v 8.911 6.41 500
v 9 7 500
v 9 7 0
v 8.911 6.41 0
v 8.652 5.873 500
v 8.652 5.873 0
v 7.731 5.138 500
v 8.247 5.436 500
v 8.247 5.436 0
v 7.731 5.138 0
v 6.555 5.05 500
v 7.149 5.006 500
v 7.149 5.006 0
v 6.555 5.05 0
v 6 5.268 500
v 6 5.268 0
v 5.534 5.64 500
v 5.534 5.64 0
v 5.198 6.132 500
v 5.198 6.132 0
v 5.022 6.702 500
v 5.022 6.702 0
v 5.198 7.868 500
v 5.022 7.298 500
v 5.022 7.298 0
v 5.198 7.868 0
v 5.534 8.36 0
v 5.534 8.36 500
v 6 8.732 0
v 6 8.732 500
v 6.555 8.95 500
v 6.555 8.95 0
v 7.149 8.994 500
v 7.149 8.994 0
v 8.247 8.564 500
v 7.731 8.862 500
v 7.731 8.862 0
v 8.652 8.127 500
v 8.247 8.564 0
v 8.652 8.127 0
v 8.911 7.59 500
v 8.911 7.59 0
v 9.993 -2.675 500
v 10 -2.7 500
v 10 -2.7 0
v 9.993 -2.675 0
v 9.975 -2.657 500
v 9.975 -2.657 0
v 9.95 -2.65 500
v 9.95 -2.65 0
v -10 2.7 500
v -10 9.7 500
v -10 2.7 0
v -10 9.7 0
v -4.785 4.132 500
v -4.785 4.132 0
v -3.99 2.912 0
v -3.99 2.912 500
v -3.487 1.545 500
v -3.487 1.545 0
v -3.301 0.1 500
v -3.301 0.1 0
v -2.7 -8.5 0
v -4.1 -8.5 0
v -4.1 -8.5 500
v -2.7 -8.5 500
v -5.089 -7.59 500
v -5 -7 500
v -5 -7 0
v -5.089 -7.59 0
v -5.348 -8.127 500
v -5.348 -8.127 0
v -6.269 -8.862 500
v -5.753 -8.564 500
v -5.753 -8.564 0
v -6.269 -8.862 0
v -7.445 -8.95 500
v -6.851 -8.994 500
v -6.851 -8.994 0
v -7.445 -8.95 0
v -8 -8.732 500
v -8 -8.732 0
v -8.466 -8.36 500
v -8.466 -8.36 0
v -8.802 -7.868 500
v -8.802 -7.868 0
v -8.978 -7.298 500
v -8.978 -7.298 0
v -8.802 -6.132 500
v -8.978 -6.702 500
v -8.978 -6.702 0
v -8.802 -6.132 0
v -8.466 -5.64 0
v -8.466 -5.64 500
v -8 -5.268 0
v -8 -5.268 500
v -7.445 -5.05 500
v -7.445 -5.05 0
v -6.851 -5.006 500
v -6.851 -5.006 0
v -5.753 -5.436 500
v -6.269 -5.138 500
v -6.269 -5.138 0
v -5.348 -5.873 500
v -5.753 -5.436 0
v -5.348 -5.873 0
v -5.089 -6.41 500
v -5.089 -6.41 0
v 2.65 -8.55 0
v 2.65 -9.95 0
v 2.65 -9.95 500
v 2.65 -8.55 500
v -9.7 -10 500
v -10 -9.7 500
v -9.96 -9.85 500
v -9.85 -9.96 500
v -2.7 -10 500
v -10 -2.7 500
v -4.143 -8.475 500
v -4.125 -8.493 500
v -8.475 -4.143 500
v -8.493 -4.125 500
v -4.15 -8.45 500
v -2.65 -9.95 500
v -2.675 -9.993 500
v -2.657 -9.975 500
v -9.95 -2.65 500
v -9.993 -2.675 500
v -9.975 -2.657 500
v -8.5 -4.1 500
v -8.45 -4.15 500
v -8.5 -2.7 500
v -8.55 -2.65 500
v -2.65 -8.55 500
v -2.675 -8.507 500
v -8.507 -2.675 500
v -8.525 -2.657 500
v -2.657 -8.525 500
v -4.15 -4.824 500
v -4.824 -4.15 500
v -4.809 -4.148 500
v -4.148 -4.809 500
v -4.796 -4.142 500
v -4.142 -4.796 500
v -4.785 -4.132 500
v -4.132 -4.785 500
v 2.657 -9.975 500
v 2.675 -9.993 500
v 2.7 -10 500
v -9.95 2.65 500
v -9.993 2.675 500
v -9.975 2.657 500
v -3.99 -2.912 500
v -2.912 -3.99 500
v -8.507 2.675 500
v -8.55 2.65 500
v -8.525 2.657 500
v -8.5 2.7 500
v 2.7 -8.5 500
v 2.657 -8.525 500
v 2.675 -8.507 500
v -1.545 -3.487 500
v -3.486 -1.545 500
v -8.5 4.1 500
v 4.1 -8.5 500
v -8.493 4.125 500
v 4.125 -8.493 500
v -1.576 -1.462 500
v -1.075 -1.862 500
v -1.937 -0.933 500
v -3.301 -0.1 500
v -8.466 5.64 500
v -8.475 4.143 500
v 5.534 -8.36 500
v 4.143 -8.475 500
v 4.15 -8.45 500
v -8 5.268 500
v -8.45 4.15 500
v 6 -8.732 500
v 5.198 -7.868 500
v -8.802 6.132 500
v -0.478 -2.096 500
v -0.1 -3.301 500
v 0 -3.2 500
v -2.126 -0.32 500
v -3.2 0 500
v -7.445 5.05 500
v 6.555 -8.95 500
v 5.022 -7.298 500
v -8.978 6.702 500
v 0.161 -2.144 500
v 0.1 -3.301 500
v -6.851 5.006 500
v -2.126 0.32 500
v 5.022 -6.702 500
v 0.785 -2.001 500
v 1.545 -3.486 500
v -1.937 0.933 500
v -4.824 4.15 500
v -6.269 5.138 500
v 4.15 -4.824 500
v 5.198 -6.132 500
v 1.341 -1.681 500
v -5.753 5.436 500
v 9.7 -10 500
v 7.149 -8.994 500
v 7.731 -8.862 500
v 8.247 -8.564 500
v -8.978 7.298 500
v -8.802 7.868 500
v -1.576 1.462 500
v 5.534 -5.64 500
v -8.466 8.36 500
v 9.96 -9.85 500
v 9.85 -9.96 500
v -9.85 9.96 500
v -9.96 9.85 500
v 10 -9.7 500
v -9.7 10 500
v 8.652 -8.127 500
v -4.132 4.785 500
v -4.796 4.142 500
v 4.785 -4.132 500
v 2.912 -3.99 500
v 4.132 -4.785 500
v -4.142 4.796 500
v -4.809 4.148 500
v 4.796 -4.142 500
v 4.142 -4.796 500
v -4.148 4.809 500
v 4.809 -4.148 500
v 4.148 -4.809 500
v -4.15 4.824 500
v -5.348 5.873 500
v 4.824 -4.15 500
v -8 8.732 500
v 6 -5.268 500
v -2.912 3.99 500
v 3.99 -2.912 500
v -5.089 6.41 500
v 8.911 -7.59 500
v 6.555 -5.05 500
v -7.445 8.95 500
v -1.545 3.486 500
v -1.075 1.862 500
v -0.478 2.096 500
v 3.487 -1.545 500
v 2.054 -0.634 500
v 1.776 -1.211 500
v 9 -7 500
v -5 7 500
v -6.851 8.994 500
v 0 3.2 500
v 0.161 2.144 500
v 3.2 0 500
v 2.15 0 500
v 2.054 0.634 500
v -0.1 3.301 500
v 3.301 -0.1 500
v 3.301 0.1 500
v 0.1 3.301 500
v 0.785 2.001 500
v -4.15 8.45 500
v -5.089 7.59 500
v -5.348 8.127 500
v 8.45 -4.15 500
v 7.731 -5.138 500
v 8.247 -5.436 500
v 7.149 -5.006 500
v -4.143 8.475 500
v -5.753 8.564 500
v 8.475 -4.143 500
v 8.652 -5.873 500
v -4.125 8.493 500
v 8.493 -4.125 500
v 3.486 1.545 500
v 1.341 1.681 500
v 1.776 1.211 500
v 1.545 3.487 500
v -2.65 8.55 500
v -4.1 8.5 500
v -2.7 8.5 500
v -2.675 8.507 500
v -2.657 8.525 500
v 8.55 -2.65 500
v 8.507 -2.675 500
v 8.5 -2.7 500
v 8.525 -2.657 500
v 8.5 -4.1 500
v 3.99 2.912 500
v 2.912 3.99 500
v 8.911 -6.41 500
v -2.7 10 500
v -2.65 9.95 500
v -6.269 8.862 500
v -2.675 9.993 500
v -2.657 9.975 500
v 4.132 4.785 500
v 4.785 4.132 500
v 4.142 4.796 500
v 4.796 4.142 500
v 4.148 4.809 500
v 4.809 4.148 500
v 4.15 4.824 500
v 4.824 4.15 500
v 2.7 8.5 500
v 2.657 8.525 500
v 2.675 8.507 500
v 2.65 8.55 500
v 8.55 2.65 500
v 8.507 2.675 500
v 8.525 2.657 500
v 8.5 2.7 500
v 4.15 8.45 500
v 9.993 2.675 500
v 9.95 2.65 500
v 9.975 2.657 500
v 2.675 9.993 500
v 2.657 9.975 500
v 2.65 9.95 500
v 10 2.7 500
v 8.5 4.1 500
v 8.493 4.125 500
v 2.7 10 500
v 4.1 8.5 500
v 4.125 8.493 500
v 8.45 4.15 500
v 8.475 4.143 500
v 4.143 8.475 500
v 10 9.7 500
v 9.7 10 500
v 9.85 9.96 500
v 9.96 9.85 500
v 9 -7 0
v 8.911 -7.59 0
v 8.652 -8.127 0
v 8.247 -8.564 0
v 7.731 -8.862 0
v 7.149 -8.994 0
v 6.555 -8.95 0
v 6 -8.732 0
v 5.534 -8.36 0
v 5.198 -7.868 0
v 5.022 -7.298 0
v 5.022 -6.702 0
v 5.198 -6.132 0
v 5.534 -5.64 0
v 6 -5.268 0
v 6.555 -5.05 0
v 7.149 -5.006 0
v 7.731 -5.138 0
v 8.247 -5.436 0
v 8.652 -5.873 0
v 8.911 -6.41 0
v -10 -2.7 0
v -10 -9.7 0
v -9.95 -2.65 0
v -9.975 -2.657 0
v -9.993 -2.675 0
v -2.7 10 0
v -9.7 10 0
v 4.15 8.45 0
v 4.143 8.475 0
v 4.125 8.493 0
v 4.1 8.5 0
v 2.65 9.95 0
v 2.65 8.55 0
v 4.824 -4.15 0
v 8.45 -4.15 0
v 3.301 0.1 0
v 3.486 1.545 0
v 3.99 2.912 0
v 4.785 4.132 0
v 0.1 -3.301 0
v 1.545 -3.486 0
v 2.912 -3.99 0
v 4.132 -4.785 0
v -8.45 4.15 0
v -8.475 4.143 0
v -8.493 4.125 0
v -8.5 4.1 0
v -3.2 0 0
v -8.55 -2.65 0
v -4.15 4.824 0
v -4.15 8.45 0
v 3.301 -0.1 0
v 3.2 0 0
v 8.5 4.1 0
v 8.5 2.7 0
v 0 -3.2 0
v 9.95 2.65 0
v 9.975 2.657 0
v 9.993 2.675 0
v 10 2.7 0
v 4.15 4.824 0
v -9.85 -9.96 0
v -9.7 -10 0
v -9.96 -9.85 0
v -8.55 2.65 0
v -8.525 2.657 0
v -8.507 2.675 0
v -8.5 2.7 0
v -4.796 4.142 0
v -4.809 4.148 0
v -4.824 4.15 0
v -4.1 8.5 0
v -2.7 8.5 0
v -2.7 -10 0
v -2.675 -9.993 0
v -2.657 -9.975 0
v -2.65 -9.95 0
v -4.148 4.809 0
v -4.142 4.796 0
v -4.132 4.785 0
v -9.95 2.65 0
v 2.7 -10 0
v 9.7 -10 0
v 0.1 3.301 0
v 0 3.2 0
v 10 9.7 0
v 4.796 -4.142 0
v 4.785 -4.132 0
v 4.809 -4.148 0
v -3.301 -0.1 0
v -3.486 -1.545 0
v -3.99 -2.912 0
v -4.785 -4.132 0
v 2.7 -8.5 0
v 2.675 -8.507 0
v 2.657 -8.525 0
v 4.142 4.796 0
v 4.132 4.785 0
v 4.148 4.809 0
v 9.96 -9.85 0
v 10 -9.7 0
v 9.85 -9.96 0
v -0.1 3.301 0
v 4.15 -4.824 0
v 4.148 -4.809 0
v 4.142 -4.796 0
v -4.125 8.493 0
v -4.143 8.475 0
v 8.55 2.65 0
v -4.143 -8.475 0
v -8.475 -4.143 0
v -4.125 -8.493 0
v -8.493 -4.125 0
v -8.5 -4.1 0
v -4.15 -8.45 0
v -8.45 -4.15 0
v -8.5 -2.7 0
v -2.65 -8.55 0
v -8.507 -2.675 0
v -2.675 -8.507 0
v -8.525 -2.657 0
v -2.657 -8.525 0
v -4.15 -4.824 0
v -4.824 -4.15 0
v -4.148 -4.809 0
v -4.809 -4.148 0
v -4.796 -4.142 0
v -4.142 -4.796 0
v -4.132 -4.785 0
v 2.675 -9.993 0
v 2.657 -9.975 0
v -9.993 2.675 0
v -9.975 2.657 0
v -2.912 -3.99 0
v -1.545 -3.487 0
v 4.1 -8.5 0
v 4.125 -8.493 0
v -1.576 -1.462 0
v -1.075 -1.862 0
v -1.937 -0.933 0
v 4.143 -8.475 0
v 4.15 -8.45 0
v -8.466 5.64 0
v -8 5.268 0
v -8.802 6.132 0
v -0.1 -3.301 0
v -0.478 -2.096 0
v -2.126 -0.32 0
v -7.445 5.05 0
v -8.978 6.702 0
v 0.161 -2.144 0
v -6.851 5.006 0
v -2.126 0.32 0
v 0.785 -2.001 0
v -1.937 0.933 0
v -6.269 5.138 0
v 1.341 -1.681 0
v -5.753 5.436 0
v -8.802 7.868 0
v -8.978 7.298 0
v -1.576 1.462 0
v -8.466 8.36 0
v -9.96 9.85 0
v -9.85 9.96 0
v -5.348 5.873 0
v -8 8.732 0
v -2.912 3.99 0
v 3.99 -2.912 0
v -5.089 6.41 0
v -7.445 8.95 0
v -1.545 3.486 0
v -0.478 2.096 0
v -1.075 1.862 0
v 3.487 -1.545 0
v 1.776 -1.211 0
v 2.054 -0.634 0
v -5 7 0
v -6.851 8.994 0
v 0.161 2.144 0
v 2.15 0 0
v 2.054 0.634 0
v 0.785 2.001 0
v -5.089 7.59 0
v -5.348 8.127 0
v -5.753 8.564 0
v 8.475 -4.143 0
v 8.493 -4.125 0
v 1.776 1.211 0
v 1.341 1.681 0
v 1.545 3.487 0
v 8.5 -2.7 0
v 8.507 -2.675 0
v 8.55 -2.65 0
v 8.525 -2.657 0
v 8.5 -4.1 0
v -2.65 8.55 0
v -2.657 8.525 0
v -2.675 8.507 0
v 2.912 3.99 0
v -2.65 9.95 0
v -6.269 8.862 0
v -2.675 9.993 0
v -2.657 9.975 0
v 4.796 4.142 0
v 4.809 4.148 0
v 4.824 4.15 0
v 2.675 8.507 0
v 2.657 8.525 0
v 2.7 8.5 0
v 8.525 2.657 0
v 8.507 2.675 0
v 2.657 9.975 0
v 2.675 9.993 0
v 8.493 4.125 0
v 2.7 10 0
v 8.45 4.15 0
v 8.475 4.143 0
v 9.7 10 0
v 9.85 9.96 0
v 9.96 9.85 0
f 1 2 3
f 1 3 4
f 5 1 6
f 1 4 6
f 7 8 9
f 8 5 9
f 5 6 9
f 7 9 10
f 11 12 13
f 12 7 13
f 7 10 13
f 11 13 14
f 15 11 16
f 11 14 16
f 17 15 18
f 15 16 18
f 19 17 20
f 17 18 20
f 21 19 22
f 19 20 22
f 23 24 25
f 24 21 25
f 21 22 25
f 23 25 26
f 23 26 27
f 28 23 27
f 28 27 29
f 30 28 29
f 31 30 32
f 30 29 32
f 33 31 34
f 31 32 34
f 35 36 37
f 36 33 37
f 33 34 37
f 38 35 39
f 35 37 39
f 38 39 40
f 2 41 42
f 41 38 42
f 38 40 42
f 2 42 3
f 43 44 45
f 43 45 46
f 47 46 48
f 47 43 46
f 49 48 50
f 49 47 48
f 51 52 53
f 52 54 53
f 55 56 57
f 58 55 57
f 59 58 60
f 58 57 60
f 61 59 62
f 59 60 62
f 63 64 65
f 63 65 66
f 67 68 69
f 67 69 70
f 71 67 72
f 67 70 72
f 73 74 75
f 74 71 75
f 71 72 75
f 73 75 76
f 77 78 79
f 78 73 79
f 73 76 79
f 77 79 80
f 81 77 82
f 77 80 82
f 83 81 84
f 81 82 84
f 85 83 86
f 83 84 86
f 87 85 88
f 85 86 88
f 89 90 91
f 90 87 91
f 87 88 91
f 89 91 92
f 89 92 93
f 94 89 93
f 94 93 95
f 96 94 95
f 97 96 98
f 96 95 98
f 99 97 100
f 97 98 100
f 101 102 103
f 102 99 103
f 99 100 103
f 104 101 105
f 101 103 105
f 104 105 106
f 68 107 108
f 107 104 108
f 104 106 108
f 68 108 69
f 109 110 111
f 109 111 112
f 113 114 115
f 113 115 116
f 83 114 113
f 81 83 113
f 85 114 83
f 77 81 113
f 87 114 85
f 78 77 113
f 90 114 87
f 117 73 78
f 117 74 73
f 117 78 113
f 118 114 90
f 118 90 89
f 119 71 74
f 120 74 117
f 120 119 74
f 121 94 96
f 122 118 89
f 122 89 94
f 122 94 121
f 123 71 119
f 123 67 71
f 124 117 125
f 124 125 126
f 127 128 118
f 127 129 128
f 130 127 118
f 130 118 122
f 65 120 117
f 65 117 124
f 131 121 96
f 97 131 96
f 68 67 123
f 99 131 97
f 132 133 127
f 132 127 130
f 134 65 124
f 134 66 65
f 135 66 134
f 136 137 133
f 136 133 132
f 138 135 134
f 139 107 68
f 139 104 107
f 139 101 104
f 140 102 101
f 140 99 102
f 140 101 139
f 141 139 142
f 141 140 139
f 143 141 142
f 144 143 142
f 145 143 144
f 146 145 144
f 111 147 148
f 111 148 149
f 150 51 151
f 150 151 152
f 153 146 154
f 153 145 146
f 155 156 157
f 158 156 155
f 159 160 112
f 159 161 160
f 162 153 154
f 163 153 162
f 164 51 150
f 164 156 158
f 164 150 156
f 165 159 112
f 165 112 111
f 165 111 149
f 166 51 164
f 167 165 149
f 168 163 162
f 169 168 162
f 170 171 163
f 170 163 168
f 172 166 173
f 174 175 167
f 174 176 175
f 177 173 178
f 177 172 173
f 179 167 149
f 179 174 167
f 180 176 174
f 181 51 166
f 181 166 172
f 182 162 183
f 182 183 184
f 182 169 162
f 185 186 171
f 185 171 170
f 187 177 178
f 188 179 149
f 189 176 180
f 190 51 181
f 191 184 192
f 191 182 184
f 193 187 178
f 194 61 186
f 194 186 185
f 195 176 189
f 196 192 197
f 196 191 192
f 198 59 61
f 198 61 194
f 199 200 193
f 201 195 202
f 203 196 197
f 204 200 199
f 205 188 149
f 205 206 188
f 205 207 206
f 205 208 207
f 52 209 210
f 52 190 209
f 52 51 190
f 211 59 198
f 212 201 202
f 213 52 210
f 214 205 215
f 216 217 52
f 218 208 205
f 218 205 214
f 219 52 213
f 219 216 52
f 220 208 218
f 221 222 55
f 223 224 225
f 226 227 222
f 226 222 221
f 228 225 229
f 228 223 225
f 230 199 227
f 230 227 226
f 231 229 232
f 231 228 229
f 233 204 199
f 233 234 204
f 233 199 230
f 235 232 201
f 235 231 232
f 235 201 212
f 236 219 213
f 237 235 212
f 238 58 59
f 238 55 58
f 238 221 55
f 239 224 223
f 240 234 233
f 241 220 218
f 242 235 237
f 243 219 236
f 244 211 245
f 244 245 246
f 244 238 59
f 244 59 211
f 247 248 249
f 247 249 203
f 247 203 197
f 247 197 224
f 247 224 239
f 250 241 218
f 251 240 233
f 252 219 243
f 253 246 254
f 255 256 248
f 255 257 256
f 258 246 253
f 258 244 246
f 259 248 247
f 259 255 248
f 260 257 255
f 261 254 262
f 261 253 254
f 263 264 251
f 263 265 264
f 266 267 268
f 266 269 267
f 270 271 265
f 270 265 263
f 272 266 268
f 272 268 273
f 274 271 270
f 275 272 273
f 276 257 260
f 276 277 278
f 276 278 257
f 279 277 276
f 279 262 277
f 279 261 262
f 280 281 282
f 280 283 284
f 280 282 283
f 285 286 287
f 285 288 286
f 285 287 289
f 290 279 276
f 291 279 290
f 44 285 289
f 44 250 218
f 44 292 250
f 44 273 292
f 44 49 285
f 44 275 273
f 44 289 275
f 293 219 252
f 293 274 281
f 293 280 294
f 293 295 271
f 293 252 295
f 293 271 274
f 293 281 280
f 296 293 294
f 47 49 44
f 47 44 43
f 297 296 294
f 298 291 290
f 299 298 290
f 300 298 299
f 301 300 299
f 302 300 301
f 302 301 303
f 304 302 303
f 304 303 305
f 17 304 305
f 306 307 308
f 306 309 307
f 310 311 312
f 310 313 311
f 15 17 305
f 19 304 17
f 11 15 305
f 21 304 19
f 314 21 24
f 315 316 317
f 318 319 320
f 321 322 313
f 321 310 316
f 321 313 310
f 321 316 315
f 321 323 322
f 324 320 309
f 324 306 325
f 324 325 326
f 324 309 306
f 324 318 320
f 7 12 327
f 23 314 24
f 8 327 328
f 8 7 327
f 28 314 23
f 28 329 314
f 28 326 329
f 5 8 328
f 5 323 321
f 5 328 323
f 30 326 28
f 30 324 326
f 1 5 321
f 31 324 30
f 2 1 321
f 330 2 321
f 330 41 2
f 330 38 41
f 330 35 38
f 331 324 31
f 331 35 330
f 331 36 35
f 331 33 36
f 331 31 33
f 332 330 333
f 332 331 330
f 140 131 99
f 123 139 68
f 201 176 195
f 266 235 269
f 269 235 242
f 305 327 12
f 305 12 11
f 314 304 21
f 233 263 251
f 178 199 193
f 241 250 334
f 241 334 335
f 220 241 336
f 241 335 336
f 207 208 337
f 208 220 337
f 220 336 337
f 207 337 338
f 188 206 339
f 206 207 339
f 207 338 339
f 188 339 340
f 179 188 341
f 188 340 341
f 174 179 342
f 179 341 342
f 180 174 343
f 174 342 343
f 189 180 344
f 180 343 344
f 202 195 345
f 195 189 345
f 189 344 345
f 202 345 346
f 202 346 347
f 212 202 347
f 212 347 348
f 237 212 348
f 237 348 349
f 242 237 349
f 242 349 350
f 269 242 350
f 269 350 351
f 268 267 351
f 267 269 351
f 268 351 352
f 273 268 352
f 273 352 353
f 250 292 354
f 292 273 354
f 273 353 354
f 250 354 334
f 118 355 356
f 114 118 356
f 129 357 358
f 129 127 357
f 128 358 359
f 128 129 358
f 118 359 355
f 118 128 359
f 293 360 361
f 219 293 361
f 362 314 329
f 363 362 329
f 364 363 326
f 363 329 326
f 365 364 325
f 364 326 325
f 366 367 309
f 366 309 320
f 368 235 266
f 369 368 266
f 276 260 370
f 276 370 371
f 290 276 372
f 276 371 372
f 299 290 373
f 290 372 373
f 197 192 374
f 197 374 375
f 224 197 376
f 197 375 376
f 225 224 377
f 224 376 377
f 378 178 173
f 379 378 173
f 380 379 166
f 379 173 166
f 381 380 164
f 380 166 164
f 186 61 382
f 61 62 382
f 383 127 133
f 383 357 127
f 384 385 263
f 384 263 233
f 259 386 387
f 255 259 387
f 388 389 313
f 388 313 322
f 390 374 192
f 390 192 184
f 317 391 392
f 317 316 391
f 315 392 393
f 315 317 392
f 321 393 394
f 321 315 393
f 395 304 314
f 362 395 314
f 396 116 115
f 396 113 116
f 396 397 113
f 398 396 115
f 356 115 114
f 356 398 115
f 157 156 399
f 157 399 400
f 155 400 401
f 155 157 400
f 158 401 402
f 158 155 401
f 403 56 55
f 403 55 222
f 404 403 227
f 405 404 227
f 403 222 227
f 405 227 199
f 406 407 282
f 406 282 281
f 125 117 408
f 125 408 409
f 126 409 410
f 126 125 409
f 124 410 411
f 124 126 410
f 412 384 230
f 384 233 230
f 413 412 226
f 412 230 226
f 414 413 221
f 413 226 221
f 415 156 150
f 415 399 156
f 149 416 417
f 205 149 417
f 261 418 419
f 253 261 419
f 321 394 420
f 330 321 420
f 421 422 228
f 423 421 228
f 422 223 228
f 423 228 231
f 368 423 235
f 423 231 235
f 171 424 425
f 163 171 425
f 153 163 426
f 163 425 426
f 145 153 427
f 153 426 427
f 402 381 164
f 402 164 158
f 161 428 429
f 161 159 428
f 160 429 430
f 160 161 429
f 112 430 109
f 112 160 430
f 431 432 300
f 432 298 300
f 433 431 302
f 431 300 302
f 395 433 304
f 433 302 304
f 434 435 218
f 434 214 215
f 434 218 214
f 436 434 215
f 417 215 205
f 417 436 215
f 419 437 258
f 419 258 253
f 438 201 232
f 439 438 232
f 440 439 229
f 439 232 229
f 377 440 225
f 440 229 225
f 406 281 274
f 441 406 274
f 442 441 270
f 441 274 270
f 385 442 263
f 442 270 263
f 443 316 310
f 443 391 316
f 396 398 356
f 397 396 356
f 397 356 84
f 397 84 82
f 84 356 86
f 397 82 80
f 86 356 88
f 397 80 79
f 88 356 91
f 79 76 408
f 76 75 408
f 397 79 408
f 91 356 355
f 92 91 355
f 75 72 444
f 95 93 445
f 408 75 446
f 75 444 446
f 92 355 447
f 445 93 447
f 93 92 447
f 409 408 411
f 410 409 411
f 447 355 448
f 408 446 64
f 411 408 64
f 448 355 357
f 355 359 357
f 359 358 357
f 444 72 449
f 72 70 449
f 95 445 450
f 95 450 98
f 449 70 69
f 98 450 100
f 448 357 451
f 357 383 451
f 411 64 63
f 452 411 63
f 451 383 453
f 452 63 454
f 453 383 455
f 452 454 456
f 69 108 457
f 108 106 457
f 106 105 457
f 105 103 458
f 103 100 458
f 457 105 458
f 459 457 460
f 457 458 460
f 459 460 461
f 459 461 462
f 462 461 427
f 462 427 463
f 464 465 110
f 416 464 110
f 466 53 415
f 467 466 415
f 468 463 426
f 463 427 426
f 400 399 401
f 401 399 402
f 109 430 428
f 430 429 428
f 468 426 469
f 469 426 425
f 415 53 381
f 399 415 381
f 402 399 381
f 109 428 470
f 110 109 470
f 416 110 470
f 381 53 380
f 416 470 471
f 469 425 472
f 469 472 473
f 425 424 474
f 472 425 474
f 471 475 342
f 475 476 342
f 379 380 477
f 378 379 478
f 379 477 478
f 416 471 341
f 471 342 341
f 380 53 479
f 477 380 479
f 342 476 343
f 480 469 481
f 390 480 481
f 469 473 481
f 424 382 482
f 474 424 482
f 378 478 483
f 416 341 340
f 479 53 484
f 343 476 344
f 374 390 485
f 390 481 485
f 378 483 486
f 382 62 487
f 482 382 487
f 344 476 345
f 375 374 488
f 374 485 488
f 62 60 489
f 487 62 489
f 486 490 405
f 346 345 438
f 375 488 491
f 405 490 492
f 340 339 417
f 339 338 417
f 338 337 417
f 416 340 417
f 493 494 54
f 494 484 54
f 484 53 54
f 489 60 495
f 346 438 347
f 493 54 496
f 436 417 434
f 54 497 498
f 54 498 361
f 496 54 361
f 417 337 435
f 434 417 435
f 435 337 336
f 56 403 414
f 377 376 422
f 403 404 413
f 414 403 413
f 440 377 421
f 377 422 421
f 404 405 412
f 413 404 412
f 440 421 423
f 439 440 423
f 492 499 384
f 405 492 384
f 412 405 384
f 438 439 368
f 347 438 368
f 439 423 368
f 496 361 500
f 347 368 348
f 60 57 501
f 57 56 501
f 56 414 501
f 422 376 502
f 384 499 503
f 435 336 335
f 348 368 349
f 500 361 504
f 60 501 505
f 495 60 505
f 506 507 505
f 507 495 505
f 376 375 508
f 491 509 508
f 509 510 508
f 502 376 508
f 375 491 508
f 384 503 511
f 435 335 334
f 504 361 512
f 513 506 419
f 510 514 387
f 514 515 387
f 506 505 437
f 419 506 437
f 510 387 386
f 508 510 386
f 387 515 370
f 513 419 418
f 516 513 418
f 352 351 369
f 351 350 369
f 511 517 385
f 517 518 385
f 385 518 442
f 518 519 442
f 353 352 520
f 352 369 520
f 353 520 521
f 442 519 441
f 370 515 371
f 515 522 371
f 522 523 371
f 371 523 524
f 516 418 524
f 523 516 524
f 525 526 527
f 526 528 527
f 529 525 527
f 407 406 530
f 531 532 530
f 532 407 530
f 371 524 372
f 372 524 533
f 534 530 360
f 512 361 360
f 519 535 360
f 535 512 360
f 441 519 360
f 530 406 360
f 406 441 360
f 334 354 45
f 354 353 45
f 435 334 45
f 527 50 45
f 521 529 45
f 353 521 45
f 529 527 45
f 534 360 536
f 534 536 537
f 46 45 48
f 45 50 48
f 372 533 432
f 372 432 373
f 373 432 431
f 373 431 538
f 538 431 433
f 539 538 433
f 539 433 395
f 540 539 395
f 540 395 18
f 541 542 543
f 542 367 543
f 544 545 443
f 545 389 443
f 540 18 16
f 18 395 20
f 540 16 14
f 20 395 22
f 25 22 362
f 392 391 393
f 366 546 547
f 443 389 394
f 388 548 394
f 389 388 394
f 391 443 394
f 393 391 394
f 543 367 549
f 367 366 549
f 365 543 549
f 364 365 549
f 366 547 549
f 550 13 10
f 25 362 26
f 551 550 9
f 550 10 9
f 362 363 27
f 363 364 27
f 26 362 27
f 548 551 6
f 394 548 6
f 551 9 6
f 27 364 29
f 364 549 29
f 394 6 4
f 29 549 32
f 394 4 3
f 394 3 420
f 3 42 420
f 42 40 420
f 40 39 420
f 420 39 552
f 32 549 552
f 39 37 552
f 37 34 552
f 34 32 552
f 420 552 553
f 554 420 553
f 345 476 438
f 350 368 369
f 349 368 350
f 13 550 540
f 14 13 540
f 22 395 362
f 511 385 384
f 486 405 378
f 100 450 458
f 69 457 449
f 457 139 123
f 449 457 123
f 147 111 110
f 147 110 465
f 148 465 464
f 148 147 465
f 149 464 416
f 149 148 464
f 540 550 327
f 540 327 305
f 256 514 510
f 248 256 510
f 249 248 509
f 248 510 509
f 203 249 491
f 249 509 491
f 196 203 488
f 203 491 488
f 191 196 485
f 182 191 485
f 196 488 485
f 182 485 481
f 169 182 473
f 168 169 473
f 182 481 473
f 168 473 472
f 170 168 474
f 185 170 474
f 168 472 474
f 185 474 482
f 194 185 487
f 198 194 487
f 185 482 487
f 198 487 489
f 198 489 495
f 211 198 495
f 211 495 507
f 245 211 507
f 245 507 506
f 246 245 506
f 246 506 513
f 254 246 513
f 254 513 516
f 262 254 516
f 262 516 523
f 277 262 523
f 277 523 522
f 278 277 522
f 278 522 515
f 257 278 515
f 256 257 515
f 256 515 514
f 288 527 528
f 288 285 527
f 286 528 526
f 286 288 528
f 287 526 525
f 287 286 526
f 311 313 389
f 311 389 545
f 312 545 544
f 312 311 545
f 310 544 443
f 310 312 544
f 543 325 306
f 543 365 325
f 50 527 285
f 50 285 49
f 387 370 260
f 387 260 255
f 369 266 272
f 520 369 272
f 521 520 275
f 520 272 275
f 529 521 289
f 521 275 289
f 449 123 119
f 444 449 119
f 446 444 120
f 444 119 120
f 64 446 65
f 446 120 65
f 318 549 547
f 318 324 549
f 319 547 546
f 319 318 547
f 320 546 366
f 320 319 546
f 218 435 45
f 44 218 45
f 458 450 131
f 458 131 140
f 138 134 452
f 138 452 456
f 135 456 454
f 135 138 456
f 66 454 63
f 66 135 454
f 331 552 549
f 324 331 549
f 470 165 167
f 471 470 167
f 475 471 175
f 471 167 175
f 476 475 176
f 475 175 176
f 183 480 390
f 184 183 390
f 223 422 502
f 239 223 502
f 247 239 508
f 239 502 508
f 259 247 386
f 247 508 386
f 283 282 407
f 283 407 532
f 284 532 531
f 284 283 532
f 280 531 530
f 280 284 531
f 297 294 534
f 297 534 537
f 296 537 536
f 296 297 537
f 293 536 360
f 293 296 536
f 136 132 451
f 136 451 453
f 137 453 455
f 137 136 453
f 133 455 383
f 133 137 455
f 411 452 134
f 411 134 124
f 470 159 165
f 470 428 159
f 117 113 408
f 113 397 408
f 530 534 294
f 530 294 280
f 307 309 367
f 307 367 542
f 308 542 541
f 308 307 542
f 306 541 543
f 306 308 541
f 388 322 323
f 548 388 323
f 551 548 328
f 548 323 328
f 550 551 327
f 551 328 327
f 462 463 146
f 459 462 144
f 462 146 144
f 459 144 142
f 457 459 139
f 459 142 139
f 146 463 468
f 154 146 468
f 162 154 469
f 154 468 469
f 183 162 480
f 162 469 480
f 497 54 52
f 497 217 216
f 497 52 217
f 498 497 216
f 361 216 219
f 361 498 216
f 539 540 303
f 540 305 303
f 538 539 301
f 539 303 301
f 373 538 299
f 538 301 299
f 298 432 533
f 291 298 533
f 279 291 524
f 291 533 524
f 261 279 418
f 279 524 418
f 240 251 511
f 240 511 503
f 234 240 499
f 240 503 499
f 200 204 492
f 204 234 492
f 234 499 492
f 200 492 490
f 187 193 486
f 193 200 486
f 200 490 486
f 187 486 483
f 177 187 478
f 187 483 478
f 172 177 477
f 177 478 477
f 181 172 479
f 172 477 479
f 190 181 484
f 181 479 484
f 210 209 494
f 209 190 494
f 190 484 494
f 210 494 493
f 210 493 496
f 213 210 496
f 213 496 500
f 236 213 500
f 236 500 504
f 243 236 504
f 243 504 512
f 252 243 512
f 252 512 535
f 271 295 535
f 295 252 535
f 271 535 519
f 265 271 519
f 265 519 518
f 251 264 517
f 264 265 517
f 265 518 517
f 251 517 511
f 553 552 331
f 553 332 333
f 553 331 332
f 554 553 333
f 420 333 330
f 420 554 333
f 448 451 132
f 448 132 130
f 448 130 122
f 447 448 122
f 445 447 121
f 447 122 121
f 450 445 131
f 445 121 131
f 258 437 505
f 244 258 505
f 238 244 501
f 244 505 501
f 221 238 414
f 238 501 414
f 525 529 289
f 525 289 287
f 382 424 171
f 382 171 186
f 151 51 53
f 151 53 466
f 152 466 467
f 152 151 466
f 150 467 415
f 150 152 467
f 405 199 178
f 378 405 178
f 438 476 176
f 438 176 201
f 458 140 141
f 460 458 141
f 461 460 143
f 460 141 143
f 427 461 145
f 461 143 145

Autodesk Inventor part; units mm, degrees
ref_plane "YZ Plane" through (0, 0, 0) normal (1, 0, 0) x (0, 1, 0)
ref_plane "XZ Plane" through (0, 0, 0) normal (0, 1, 0) x (-1, 0, 0)
ref_plane "XY Plane" through (0, 0, 0) normal (0, 0, 1) x (1, 0, 0)
sketch "스케치1" plane through (0, 0, 0) normal (0, 0, 1) x (1, 0, 0)
  line L0 (-9.7, -10) -> (9.7, -10)
  line L1 (10, -9.7) -> (10, 9.7)
  line L2 (9.7, 10) -> (-9.7, 10)
  line L3 (-10, 9.7) -> (-10, -9.7)
  line L4 (-10, -10) -> (10, 10) construction
  line L5 (10, -10) -> (-10, 10) construction
  circle A0 centre (-7, 7) radius 2
  line L6 (0, 15.6683) -> (0, -20)
  line L7 (-22.0072, 0) -> (22.0072, 0)
  circle A1 centre (0, 0) radius 2.15
  arc A2 (-9.7, 10) -> (-10, 9.7) centre (-9.7, 9.7) ccw
  arc A3 (10, 9.7) -> (9.7, 10) centre (9.7, 9.7) ccw
  arc A4 (9.7, -10) -> (10, -9.7) centre (9.7, -9.7) ccw
  arc A5 (-10, -9.7) -> (-9.7, -10) centre (-9.7, -9.7) ccw
  line L8 (-2.65, 10) -> (-2.65, 8.5)
  line L9 (-2.65, 8.5) -> (-4.15, 8.5)
  line L10 (-4.15, 8.5) -> (-4.15, 4.8)
  line L11 (4.15, 4.8) -> (4.15, 8.5)
  line L12 (4.15, 8.5) -> (2.65, 8.5)
  line L13 (2.65, 8.5) -> (2.65, 10)
  line L14 (-0.1, 3.3008) -> (0, 3.2)
  line L15 (0.1, 3.3008) -> (0, 3.2)
  arc A6 (-4.15, 4.8) -> (-0.1, 3.3008) centre (0, 9.7908) ccw
  arc A7 (0.1, 3.3008) -> (4.15, 4.8) centre (0, 9.7908) ccw
  circle A8 centre (7, 7) radius 2
  circle A9 centre (-7, -7) radius 2
  circle A10 centre (7, -7) radius 2
  line L16 (-3.3008, 0.1) -> (-3.2, 0)
  line L17 (-3.3008, -0.1) -> (-3.2, 0)
  arc A11 (-4.8, -4.15) -> (-3.3008, -0.1) centre (-9.7908, 0) ccw
  line L18 (-8.5, -4.15) -> (-4.8, -4.15)
  line L19 (-10, -2.65) -> (-8.5, -2.65)
  line L20 (-8.5, 2.65) -> (-10, 2.65)
  arc A12 (-3.3008, 0.1) -> (-4.8, 4.15) centre (-9.7908, 0) ccw
  line L21 (-4.8, 4.15) -> (-8.5, 4.15)
  line L22 (-8.5, 4.15) -> (-8.5, 2.65)
  line L23 (-8.5, -2.65) -> (-8.5, -4.15)
  line L24 (-0.1, -3.3008) -> (0, -3.2)
  line L25 (0.1, -3.3008) -> (0, -3.2)
  arc A13 (4.15, -4.8) -> (0.1, -3.3008) centre (0, -9.7908) ccw
  line L26 (4.15, -8.5) -> (4.15, -4.8)
  line L27 (2.65, -10) -> (2.65, -8.5)
  line L28 (-2.65, -8.5) -> (-2.65, -10)
  arc A14 (-0.1, -3.3008) -> (-4.15, -4.8) centre (0, -9.7908) ccw
  line L29 (-4.15, -4.8) -> (-4.15, -8.5)
  line L30 (-4.15, -8.5) -> (-2.65, -8.5)
  line L31 (2.65, -8.5) -> (4.15, -8.5)
  line L32 (3.3008, -0.1) -> (3.2, 0)
  line L33 (3.3008, 0.1) -> (3.2, 0)
  arc A15 (4.8, 4.15) -> (3.3008, 0.1) centre (9.7908, 0) ccw
  line L34 (8.5, 4.15) -> (4.8, 4.15)
  line L35 (10, 2.65) -> (8.5, 2.65)
  line L36 (8.5, -2.65) -> (10, -2.65)
  arc A16 (3.3008, -0.1) -> (4.8, -4.15) centre (9.7908, 0) ccw
  line L37 (4.8, -4.15) -> (8.5, -4.15)
  line L38 (8.5, -4.15) -> (8.5, -2.65)
  line L39 (8.5, 2.65) -> (8.5, 4.15)
  point P0 (2.65, 9.25)
  point P1 (-2.65, 9.25)
  point P2 (-4.15, 6.65)
  point P3 (0, 3.3)
  point P4 (-3.3, 0)
  point P5 (-9.25, -2.65)
  point P6 (-6.65, -4.15)
  point P7 (-9.25, 2.65)
  point P8 (0, -3.3)
  point P9 (2.65, -9.25)
  point P10 (4.15, -6.65)
  point P11 (-2.65, -9.25)
  point P12 (3.3, 0)
  point P13 (9.25, 2.65)
  point P14 (6.65, 4.15)
  point P15 (9.25, -2.65)
  dimension "d0" = 20
  dimension "d1" = 20
  dimension "d2" = 4
  dimension "d3" = 14
  dimension "d4" = 14
  dimension "d5" = 4.3
  dimension "d6" = 0.3
  dimension "d9" = 8.3
  dimension "d10" = 5.3
  dimension "d11" = 5.3
  dimension "d12" = 1.5
  dimension "d15" = 0.1
  dimension "d16" = 0.1
  dimension "d17" = 0.1
  dimension "d19" = 3.7
  dimension "d22" = 360
extrude "프로파일 길이 설정" add sketch "스케치1" along normal blind 500 contours A5 L3 L19 L23 L18 A11 L17 L7 A1 L6 L24 A14 L29 L30 L28 L0 | L27 L31 L26 A13 L25 L6 A1 L7 L32 A16 L37 L38 L36 L1 A4 L0 | L3 A2 L2 L8 L9 L10 A6 L14 L6 A1 L7 L16 A12 L21 L22 L20 | A1 L6 L15 A7 L11 L12 L13 L2 A3 L1 L35 L39 L34 A15 L33 L7
fillet "모서리" radius 0.05 32 edges at (10, 2.65, 250) (8.5, 2.65, 250) (8.5, 4.15, 250) (10, -2.65, 250) (8.5, -2.65, 250) (8.5, -4.15, 250) (2.65, 8.5, 250) (2.65, 10, 250) (4.15, 8.5, 250) (-4.15, 8.5, 250) (-2.65, 8.5, 250) (-2.65, 10, 250) (-10, 2.65, 250) (-8.5, 2.65, 250) (-8.5, 4.15, 250) (-8.5, -4.15, 250) (-8.5, -2.65, 250) (-10, -2.65, 250) (-2.65, -10, 250) (-2.65, -8.5, 250) (-4.15, -8.5, 250) (2.65, -8.5, 250) (4.15, -8.5, 250) (2.65, -10, 250) (4.15, -4.8, 250) (-4.15, -4.8, 250) (-4.8, -4.15, 250) (-4.8, 4.15, 250) (-4.15, 4.8, 250) (4.15, 4.8, 250) (4.8, -4.15, 250) (4.8, 4.15, 250)
equation "\"d0\" = d1"
equation "\"d11\" = d10"
equation "\"d17\" = d16"
properties part number "500mm 20x20 Profile"
